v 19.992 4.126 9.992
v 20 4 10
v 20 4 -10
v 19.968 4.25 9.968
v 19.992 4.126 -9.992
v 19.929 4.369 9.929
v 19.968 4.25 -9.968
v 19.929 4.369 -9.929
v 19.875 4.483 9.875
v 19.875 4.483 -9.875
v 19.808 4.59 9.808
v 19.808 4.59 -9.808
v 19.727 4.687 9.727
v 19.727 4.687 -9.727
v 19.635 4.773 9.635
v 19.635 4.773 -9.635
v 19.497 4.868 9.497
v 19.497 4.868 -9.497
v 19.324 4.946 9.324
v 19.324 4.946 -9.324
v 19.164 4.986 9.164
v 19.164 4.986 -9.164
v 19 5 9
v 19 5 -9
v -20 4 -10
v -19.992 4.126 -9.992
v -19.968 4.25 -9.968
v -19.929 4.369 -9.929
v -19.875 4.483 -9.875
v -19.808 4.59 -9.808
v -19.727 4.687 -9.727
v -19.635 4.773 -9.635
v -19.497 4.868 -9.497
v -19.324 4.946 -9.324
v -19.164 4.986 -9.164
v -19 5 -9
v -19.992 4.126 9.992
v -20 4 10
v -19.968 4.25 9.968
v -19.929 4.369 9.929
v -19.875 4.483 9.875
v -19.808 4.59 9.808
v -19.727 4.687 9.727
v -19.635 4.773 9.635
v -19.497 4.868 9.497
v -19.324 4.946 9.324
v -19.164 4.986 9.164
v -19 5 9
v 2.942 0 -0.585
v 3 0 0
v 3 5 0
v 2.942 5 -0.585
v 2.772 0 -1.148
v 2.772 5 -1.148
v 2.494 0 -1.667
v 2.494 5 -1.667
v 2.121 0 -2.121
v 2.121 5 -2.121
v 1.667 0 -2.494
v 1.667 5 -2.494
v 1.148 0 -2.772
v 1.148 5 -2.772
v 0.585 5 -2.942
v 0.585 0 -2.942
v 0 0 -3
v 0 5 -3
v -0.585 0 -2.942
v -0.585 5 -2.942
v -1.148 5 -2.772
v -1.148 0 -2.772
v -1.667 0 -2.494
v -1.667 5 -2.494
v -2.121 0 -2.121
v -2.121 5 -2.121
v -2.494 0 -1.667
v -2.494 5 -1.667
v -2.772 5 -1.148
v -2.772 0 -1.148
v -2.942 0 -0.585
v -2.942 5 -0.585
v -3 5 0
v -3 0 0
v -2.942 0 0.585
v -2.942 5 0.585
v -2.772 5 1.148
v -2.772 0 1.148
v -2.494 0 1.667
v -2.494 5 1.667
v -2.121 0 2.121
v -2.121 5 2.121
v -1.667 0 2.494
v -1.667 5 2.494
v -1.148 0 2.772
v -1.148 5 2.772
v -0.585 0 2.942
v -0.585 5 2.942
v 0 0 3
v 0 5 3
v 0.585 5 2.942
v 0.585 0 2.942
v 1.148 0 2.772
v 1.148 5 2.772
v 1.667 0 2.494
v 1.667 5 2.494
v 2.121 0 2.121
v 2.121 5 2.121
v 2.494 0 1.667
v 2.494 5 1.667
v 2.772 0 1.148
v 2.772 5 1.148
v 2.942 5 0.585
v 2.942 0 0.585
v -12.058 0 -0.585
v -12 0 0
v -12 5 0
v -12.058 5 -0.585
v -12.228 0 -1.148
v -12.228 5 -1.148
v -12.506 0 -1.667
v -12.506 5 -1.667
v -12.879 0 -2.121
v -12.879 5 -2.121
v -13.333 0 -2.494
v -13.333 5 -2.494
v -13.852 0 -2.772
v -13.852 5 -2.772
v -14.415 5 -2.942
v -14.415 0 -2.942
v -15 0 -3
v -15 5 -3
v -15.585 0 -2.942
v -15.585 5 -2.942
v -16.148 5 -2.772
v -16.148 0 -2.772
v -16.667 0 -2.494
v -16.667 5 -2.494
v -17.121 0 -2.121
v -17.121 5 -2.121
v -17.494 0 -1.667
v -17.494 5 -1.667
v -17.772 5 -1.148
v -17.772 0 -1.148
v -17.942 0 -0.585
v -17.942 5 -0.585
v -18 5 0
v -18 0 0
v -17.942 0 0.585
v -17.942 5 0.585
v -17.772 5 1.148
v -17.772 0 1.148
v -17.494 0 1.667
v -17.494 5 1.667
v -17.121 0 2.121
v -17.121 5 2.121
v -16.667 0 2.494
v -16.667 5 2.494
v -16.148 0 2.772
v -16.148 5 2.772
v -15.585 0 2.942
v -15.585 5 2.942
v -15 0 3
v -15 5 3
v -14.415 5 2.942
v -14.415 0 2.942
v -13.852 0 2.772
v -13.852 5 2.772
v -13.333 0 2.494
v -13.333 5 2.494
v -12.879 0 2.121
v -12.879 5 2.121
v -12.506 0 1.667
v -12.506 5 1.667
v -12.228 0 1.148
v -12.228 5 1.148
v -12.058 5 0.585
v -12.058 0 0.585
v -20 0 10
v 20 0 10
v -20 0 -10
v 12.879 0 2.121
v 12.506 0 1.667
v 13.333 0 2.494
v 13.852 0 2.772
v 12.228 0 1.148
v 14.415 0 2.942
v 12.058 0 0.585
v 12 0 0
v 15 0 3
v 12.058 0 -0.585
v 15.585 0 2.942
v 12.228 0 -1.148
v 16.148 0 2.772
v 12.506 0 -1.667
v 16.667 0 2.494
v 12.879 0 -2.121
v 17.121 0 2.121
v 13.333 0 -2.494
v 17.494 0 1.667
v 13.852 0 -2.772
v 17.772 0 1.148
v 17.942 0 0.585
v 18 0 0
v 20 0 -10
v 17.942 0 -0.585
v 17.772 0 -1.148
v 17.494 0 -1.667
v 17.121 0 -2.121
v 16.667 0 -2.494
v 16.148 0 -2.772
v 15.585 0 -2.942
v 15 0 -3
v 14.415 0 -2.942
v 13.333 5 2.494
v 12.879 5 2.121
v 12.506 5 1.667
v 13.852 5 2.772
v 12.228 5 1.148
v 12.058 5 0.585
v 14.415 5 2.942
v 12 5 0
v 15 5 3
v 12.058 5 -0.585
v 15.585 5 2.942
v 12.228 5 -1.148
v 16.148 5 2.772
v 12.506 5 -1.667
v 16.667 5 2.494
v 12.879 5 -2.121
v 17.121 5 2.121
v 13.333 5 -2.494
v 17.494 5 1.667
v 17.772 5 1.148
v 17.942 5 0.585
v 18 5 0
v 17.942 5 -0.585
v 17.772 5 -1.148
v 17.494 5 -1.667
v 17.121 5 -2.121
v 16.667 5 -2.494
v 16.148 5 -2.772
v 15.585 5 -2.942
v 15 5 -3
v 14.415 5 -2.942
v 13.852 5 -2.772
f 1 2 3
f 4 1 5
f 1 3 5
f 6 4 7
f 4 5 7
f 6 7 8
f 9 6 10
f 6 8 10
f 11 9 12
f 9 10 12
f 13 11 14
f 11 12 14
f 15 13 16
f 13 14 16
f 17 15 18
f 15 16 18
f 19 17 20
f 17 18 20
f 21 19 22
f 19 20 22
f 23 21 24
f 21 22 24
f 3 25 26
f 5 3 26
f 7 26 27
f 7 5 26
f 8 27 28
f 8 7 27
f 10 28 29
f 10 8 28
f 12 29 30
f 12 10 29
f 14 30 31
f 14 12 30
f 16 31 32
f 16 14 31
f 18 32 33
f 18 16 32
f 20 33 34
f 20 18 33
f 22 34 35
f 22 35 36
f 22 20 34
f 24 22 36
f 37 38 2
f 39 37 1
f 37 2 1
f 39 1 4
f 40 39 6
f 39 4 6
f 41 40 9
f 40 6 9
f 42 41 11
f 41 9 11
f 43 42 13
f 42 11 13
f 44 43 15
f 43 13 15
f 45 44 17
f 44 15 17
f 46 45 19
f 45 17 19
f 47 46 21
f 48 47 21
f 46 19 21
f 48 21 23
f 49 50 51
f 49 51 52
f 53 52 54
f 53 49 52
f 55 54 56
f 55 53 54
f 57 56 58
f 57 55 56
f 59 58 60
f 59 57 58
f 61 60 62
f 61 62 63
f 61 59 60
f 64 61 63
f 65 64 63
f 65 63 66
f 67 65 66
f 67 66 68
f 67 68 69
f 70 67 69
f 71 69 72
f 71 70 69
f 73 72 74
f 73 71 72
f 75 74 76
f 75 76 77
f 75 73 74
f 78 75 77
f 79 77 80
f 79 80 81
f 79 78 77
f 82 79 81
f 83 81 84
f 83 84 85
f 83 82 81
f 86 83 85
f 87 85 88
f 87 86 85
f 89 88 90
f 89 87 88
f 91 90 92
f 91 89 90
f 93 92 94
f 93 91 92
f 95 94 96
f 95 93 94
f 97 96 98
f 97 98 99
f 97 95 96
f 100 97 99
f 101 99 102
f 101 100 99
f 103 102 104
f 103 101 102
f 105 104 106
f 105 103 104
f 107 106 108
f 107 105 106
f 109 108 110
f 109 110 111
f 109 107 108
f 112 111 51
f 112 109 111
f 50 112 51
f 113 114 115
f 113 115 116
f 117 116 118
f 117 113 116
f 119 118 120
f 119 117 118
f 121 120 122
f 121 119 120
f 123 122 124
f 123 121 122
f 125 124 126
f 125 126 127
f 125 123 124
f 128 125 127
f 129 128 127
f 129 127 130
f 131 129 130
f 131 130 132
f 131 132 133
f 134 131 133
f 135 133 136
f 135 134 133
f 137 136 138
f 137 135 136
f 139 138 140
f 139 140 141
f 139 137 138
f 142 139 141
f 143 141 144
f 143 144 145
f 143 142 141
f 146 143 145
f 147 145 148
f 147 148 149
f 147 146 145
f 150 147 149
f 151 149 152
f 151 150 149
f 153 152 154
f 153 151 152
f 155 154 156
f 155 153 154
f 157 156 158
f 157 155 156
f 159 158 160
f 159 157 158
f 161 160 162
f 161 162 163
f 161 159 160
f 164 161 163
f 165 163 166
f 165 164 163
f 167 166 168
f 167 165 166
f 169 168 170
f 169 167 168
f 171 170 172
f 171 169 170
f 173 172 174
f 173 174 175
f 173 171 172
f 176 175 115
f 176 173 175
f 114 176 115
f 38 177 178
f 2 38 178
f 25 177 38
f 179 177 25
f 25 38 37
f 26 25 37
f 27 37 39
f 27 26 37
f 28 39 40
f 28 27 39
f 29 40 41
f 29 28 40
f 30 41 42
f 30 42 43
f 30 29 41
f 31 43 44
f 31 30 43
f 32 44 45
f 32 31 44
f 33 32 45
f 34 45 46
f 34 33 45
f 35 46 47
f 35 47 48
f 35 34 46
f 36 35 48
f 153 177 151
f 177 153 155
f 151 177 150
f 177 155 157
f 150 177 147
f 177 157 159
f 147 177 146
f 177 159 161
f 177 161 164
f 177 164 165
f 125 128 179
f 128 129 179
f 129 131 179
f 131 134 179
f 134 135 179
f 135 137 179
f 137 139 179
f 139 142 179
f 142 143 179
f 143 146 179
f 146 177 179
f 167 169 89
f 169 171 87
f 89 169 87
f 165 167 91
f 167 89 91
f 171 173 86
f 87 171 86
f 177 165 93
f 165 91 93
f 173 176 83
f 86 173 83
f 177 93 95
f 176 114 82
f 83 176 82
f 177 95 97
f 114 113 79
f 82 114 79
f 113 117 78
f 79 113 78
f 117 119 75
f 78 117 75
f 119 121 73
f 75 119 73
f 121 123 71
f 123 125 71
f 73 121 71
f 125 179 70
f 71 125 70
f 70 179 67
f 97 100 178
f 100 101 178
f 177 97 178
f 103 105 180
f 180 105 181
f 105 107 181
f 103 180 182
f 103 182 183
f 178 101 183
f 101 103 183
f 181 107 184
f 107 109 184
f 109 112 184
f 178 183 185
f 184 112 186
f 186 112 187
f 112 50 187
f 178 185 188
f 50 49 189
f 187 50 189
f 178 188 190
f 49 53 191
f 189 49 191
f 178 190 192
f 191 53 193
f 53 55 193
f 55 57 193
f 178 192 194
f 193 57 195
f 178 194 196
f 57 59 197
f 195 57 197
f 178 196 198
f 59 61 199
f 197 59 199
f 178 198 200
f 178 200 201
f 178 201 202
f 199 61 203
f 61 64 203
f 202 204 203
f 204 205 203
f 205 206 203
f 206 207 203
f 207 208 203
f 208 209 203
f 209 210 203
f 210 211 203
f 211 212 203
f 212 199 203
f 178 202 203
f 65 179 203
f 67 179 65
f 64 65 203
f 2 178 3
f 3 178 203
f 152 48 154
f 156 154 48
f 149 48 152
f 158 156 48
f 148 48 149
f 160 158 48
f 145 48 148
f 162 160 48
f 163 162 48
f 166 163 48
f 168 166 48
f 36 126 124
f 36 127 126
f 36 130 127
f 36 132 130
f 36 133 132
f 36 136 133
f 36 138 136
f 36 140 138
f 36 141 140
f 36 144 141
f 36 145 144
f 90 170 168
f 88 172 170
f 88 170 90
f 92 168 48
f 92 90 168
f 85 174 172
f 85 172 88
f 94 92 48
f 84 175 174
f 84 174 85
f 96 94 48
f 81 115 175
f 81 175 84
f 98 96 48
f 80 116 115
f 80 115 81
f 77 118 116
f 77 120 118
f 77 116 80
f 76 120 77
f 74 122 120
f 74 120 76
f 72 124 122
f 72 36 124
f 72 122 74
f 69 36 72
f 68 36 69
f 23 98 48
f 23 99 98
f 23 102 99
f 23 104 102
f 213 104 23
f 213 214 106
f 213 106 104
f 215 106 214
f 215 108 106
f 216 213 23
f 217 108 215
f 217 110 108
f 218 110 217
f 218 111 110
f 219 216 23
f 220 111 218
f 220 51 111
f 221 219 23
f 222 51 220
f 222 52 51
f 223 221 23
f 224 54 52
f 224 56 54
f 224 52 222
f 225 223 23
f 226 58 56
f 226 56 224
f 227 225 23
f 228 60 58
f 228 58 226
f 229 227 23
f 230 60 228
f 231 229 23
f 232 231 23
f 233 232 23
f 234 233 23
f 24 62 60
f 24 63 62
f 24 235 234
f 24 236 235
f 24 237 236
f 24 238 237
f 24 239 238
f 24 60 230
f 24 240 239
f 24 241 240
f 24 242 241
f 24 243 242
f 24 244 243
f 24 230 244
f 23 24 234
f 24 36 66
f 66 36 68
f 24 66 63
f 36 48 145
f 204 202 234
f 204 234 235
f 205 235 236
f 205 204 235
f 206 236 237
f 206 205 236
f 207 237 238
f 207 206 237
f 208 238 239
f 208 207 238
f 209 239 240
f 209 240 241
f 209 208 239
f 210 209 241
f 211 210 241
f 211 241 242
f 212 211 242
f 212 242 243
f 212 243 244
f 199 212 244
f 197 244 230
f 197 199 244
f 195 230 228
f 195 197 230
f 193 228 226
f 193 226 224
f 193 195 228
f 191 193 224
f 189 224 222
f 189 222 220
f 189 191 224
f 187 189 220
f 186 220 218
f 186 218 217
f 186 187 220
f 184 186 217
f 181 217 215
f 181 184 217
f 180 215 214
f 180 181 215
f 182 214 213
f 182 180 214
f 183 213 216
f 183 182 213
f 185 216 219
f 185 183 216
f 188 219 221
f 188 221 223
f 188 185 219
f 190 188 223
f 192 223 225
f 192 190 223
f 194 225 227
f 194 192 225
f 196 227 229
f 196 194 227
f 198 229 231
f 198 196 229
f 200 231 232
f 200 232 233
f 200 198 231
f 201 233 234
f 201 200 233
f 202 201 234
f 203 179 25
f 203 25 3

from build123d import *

# Parameters (mm, degrees)
SKETCH1_W           = 40
SKETCH1_H           = 20
SKETCH1_R           = 3
BOSS_EXTRUDE1_DEPTH = 5
FILLET1_R           = 1


with BuildPart() as part:
    # Sketch1 → Boss-Extrude1 (new body)
    with BuildSketch(Plane(origin=(0, 0, 0), x_dir=(1, 0, 0), z_dir=(0, 1, 0))):
        Rectangle(SKETCH1_W, SKETCH1_H)
        with Locations((-15, 0)):
            Circle(SKETCH1_R, mode=Mode.SUBTRACT)
        with Locations((15, 0)):
            Circle(SKETCH1_R, mode=Mode.SUBTRACT)
        Circle(SKETCH1_R, mode=Mode.SUBTRACT)
    extrude(amount=BOSS_EXTRUDE1_DEPTH)

    # Fillet1
    fillet1_edges = [part.edges().sort_by_distance(p)[0] for p in [
        (20, 5, 0),
        (0, 5, -10),
        (-20, 5, 0),
        (0, 5, 10),
    ]]
    fillet(fillet1_edges, radius=FILLET1_R)


solid = part.part
